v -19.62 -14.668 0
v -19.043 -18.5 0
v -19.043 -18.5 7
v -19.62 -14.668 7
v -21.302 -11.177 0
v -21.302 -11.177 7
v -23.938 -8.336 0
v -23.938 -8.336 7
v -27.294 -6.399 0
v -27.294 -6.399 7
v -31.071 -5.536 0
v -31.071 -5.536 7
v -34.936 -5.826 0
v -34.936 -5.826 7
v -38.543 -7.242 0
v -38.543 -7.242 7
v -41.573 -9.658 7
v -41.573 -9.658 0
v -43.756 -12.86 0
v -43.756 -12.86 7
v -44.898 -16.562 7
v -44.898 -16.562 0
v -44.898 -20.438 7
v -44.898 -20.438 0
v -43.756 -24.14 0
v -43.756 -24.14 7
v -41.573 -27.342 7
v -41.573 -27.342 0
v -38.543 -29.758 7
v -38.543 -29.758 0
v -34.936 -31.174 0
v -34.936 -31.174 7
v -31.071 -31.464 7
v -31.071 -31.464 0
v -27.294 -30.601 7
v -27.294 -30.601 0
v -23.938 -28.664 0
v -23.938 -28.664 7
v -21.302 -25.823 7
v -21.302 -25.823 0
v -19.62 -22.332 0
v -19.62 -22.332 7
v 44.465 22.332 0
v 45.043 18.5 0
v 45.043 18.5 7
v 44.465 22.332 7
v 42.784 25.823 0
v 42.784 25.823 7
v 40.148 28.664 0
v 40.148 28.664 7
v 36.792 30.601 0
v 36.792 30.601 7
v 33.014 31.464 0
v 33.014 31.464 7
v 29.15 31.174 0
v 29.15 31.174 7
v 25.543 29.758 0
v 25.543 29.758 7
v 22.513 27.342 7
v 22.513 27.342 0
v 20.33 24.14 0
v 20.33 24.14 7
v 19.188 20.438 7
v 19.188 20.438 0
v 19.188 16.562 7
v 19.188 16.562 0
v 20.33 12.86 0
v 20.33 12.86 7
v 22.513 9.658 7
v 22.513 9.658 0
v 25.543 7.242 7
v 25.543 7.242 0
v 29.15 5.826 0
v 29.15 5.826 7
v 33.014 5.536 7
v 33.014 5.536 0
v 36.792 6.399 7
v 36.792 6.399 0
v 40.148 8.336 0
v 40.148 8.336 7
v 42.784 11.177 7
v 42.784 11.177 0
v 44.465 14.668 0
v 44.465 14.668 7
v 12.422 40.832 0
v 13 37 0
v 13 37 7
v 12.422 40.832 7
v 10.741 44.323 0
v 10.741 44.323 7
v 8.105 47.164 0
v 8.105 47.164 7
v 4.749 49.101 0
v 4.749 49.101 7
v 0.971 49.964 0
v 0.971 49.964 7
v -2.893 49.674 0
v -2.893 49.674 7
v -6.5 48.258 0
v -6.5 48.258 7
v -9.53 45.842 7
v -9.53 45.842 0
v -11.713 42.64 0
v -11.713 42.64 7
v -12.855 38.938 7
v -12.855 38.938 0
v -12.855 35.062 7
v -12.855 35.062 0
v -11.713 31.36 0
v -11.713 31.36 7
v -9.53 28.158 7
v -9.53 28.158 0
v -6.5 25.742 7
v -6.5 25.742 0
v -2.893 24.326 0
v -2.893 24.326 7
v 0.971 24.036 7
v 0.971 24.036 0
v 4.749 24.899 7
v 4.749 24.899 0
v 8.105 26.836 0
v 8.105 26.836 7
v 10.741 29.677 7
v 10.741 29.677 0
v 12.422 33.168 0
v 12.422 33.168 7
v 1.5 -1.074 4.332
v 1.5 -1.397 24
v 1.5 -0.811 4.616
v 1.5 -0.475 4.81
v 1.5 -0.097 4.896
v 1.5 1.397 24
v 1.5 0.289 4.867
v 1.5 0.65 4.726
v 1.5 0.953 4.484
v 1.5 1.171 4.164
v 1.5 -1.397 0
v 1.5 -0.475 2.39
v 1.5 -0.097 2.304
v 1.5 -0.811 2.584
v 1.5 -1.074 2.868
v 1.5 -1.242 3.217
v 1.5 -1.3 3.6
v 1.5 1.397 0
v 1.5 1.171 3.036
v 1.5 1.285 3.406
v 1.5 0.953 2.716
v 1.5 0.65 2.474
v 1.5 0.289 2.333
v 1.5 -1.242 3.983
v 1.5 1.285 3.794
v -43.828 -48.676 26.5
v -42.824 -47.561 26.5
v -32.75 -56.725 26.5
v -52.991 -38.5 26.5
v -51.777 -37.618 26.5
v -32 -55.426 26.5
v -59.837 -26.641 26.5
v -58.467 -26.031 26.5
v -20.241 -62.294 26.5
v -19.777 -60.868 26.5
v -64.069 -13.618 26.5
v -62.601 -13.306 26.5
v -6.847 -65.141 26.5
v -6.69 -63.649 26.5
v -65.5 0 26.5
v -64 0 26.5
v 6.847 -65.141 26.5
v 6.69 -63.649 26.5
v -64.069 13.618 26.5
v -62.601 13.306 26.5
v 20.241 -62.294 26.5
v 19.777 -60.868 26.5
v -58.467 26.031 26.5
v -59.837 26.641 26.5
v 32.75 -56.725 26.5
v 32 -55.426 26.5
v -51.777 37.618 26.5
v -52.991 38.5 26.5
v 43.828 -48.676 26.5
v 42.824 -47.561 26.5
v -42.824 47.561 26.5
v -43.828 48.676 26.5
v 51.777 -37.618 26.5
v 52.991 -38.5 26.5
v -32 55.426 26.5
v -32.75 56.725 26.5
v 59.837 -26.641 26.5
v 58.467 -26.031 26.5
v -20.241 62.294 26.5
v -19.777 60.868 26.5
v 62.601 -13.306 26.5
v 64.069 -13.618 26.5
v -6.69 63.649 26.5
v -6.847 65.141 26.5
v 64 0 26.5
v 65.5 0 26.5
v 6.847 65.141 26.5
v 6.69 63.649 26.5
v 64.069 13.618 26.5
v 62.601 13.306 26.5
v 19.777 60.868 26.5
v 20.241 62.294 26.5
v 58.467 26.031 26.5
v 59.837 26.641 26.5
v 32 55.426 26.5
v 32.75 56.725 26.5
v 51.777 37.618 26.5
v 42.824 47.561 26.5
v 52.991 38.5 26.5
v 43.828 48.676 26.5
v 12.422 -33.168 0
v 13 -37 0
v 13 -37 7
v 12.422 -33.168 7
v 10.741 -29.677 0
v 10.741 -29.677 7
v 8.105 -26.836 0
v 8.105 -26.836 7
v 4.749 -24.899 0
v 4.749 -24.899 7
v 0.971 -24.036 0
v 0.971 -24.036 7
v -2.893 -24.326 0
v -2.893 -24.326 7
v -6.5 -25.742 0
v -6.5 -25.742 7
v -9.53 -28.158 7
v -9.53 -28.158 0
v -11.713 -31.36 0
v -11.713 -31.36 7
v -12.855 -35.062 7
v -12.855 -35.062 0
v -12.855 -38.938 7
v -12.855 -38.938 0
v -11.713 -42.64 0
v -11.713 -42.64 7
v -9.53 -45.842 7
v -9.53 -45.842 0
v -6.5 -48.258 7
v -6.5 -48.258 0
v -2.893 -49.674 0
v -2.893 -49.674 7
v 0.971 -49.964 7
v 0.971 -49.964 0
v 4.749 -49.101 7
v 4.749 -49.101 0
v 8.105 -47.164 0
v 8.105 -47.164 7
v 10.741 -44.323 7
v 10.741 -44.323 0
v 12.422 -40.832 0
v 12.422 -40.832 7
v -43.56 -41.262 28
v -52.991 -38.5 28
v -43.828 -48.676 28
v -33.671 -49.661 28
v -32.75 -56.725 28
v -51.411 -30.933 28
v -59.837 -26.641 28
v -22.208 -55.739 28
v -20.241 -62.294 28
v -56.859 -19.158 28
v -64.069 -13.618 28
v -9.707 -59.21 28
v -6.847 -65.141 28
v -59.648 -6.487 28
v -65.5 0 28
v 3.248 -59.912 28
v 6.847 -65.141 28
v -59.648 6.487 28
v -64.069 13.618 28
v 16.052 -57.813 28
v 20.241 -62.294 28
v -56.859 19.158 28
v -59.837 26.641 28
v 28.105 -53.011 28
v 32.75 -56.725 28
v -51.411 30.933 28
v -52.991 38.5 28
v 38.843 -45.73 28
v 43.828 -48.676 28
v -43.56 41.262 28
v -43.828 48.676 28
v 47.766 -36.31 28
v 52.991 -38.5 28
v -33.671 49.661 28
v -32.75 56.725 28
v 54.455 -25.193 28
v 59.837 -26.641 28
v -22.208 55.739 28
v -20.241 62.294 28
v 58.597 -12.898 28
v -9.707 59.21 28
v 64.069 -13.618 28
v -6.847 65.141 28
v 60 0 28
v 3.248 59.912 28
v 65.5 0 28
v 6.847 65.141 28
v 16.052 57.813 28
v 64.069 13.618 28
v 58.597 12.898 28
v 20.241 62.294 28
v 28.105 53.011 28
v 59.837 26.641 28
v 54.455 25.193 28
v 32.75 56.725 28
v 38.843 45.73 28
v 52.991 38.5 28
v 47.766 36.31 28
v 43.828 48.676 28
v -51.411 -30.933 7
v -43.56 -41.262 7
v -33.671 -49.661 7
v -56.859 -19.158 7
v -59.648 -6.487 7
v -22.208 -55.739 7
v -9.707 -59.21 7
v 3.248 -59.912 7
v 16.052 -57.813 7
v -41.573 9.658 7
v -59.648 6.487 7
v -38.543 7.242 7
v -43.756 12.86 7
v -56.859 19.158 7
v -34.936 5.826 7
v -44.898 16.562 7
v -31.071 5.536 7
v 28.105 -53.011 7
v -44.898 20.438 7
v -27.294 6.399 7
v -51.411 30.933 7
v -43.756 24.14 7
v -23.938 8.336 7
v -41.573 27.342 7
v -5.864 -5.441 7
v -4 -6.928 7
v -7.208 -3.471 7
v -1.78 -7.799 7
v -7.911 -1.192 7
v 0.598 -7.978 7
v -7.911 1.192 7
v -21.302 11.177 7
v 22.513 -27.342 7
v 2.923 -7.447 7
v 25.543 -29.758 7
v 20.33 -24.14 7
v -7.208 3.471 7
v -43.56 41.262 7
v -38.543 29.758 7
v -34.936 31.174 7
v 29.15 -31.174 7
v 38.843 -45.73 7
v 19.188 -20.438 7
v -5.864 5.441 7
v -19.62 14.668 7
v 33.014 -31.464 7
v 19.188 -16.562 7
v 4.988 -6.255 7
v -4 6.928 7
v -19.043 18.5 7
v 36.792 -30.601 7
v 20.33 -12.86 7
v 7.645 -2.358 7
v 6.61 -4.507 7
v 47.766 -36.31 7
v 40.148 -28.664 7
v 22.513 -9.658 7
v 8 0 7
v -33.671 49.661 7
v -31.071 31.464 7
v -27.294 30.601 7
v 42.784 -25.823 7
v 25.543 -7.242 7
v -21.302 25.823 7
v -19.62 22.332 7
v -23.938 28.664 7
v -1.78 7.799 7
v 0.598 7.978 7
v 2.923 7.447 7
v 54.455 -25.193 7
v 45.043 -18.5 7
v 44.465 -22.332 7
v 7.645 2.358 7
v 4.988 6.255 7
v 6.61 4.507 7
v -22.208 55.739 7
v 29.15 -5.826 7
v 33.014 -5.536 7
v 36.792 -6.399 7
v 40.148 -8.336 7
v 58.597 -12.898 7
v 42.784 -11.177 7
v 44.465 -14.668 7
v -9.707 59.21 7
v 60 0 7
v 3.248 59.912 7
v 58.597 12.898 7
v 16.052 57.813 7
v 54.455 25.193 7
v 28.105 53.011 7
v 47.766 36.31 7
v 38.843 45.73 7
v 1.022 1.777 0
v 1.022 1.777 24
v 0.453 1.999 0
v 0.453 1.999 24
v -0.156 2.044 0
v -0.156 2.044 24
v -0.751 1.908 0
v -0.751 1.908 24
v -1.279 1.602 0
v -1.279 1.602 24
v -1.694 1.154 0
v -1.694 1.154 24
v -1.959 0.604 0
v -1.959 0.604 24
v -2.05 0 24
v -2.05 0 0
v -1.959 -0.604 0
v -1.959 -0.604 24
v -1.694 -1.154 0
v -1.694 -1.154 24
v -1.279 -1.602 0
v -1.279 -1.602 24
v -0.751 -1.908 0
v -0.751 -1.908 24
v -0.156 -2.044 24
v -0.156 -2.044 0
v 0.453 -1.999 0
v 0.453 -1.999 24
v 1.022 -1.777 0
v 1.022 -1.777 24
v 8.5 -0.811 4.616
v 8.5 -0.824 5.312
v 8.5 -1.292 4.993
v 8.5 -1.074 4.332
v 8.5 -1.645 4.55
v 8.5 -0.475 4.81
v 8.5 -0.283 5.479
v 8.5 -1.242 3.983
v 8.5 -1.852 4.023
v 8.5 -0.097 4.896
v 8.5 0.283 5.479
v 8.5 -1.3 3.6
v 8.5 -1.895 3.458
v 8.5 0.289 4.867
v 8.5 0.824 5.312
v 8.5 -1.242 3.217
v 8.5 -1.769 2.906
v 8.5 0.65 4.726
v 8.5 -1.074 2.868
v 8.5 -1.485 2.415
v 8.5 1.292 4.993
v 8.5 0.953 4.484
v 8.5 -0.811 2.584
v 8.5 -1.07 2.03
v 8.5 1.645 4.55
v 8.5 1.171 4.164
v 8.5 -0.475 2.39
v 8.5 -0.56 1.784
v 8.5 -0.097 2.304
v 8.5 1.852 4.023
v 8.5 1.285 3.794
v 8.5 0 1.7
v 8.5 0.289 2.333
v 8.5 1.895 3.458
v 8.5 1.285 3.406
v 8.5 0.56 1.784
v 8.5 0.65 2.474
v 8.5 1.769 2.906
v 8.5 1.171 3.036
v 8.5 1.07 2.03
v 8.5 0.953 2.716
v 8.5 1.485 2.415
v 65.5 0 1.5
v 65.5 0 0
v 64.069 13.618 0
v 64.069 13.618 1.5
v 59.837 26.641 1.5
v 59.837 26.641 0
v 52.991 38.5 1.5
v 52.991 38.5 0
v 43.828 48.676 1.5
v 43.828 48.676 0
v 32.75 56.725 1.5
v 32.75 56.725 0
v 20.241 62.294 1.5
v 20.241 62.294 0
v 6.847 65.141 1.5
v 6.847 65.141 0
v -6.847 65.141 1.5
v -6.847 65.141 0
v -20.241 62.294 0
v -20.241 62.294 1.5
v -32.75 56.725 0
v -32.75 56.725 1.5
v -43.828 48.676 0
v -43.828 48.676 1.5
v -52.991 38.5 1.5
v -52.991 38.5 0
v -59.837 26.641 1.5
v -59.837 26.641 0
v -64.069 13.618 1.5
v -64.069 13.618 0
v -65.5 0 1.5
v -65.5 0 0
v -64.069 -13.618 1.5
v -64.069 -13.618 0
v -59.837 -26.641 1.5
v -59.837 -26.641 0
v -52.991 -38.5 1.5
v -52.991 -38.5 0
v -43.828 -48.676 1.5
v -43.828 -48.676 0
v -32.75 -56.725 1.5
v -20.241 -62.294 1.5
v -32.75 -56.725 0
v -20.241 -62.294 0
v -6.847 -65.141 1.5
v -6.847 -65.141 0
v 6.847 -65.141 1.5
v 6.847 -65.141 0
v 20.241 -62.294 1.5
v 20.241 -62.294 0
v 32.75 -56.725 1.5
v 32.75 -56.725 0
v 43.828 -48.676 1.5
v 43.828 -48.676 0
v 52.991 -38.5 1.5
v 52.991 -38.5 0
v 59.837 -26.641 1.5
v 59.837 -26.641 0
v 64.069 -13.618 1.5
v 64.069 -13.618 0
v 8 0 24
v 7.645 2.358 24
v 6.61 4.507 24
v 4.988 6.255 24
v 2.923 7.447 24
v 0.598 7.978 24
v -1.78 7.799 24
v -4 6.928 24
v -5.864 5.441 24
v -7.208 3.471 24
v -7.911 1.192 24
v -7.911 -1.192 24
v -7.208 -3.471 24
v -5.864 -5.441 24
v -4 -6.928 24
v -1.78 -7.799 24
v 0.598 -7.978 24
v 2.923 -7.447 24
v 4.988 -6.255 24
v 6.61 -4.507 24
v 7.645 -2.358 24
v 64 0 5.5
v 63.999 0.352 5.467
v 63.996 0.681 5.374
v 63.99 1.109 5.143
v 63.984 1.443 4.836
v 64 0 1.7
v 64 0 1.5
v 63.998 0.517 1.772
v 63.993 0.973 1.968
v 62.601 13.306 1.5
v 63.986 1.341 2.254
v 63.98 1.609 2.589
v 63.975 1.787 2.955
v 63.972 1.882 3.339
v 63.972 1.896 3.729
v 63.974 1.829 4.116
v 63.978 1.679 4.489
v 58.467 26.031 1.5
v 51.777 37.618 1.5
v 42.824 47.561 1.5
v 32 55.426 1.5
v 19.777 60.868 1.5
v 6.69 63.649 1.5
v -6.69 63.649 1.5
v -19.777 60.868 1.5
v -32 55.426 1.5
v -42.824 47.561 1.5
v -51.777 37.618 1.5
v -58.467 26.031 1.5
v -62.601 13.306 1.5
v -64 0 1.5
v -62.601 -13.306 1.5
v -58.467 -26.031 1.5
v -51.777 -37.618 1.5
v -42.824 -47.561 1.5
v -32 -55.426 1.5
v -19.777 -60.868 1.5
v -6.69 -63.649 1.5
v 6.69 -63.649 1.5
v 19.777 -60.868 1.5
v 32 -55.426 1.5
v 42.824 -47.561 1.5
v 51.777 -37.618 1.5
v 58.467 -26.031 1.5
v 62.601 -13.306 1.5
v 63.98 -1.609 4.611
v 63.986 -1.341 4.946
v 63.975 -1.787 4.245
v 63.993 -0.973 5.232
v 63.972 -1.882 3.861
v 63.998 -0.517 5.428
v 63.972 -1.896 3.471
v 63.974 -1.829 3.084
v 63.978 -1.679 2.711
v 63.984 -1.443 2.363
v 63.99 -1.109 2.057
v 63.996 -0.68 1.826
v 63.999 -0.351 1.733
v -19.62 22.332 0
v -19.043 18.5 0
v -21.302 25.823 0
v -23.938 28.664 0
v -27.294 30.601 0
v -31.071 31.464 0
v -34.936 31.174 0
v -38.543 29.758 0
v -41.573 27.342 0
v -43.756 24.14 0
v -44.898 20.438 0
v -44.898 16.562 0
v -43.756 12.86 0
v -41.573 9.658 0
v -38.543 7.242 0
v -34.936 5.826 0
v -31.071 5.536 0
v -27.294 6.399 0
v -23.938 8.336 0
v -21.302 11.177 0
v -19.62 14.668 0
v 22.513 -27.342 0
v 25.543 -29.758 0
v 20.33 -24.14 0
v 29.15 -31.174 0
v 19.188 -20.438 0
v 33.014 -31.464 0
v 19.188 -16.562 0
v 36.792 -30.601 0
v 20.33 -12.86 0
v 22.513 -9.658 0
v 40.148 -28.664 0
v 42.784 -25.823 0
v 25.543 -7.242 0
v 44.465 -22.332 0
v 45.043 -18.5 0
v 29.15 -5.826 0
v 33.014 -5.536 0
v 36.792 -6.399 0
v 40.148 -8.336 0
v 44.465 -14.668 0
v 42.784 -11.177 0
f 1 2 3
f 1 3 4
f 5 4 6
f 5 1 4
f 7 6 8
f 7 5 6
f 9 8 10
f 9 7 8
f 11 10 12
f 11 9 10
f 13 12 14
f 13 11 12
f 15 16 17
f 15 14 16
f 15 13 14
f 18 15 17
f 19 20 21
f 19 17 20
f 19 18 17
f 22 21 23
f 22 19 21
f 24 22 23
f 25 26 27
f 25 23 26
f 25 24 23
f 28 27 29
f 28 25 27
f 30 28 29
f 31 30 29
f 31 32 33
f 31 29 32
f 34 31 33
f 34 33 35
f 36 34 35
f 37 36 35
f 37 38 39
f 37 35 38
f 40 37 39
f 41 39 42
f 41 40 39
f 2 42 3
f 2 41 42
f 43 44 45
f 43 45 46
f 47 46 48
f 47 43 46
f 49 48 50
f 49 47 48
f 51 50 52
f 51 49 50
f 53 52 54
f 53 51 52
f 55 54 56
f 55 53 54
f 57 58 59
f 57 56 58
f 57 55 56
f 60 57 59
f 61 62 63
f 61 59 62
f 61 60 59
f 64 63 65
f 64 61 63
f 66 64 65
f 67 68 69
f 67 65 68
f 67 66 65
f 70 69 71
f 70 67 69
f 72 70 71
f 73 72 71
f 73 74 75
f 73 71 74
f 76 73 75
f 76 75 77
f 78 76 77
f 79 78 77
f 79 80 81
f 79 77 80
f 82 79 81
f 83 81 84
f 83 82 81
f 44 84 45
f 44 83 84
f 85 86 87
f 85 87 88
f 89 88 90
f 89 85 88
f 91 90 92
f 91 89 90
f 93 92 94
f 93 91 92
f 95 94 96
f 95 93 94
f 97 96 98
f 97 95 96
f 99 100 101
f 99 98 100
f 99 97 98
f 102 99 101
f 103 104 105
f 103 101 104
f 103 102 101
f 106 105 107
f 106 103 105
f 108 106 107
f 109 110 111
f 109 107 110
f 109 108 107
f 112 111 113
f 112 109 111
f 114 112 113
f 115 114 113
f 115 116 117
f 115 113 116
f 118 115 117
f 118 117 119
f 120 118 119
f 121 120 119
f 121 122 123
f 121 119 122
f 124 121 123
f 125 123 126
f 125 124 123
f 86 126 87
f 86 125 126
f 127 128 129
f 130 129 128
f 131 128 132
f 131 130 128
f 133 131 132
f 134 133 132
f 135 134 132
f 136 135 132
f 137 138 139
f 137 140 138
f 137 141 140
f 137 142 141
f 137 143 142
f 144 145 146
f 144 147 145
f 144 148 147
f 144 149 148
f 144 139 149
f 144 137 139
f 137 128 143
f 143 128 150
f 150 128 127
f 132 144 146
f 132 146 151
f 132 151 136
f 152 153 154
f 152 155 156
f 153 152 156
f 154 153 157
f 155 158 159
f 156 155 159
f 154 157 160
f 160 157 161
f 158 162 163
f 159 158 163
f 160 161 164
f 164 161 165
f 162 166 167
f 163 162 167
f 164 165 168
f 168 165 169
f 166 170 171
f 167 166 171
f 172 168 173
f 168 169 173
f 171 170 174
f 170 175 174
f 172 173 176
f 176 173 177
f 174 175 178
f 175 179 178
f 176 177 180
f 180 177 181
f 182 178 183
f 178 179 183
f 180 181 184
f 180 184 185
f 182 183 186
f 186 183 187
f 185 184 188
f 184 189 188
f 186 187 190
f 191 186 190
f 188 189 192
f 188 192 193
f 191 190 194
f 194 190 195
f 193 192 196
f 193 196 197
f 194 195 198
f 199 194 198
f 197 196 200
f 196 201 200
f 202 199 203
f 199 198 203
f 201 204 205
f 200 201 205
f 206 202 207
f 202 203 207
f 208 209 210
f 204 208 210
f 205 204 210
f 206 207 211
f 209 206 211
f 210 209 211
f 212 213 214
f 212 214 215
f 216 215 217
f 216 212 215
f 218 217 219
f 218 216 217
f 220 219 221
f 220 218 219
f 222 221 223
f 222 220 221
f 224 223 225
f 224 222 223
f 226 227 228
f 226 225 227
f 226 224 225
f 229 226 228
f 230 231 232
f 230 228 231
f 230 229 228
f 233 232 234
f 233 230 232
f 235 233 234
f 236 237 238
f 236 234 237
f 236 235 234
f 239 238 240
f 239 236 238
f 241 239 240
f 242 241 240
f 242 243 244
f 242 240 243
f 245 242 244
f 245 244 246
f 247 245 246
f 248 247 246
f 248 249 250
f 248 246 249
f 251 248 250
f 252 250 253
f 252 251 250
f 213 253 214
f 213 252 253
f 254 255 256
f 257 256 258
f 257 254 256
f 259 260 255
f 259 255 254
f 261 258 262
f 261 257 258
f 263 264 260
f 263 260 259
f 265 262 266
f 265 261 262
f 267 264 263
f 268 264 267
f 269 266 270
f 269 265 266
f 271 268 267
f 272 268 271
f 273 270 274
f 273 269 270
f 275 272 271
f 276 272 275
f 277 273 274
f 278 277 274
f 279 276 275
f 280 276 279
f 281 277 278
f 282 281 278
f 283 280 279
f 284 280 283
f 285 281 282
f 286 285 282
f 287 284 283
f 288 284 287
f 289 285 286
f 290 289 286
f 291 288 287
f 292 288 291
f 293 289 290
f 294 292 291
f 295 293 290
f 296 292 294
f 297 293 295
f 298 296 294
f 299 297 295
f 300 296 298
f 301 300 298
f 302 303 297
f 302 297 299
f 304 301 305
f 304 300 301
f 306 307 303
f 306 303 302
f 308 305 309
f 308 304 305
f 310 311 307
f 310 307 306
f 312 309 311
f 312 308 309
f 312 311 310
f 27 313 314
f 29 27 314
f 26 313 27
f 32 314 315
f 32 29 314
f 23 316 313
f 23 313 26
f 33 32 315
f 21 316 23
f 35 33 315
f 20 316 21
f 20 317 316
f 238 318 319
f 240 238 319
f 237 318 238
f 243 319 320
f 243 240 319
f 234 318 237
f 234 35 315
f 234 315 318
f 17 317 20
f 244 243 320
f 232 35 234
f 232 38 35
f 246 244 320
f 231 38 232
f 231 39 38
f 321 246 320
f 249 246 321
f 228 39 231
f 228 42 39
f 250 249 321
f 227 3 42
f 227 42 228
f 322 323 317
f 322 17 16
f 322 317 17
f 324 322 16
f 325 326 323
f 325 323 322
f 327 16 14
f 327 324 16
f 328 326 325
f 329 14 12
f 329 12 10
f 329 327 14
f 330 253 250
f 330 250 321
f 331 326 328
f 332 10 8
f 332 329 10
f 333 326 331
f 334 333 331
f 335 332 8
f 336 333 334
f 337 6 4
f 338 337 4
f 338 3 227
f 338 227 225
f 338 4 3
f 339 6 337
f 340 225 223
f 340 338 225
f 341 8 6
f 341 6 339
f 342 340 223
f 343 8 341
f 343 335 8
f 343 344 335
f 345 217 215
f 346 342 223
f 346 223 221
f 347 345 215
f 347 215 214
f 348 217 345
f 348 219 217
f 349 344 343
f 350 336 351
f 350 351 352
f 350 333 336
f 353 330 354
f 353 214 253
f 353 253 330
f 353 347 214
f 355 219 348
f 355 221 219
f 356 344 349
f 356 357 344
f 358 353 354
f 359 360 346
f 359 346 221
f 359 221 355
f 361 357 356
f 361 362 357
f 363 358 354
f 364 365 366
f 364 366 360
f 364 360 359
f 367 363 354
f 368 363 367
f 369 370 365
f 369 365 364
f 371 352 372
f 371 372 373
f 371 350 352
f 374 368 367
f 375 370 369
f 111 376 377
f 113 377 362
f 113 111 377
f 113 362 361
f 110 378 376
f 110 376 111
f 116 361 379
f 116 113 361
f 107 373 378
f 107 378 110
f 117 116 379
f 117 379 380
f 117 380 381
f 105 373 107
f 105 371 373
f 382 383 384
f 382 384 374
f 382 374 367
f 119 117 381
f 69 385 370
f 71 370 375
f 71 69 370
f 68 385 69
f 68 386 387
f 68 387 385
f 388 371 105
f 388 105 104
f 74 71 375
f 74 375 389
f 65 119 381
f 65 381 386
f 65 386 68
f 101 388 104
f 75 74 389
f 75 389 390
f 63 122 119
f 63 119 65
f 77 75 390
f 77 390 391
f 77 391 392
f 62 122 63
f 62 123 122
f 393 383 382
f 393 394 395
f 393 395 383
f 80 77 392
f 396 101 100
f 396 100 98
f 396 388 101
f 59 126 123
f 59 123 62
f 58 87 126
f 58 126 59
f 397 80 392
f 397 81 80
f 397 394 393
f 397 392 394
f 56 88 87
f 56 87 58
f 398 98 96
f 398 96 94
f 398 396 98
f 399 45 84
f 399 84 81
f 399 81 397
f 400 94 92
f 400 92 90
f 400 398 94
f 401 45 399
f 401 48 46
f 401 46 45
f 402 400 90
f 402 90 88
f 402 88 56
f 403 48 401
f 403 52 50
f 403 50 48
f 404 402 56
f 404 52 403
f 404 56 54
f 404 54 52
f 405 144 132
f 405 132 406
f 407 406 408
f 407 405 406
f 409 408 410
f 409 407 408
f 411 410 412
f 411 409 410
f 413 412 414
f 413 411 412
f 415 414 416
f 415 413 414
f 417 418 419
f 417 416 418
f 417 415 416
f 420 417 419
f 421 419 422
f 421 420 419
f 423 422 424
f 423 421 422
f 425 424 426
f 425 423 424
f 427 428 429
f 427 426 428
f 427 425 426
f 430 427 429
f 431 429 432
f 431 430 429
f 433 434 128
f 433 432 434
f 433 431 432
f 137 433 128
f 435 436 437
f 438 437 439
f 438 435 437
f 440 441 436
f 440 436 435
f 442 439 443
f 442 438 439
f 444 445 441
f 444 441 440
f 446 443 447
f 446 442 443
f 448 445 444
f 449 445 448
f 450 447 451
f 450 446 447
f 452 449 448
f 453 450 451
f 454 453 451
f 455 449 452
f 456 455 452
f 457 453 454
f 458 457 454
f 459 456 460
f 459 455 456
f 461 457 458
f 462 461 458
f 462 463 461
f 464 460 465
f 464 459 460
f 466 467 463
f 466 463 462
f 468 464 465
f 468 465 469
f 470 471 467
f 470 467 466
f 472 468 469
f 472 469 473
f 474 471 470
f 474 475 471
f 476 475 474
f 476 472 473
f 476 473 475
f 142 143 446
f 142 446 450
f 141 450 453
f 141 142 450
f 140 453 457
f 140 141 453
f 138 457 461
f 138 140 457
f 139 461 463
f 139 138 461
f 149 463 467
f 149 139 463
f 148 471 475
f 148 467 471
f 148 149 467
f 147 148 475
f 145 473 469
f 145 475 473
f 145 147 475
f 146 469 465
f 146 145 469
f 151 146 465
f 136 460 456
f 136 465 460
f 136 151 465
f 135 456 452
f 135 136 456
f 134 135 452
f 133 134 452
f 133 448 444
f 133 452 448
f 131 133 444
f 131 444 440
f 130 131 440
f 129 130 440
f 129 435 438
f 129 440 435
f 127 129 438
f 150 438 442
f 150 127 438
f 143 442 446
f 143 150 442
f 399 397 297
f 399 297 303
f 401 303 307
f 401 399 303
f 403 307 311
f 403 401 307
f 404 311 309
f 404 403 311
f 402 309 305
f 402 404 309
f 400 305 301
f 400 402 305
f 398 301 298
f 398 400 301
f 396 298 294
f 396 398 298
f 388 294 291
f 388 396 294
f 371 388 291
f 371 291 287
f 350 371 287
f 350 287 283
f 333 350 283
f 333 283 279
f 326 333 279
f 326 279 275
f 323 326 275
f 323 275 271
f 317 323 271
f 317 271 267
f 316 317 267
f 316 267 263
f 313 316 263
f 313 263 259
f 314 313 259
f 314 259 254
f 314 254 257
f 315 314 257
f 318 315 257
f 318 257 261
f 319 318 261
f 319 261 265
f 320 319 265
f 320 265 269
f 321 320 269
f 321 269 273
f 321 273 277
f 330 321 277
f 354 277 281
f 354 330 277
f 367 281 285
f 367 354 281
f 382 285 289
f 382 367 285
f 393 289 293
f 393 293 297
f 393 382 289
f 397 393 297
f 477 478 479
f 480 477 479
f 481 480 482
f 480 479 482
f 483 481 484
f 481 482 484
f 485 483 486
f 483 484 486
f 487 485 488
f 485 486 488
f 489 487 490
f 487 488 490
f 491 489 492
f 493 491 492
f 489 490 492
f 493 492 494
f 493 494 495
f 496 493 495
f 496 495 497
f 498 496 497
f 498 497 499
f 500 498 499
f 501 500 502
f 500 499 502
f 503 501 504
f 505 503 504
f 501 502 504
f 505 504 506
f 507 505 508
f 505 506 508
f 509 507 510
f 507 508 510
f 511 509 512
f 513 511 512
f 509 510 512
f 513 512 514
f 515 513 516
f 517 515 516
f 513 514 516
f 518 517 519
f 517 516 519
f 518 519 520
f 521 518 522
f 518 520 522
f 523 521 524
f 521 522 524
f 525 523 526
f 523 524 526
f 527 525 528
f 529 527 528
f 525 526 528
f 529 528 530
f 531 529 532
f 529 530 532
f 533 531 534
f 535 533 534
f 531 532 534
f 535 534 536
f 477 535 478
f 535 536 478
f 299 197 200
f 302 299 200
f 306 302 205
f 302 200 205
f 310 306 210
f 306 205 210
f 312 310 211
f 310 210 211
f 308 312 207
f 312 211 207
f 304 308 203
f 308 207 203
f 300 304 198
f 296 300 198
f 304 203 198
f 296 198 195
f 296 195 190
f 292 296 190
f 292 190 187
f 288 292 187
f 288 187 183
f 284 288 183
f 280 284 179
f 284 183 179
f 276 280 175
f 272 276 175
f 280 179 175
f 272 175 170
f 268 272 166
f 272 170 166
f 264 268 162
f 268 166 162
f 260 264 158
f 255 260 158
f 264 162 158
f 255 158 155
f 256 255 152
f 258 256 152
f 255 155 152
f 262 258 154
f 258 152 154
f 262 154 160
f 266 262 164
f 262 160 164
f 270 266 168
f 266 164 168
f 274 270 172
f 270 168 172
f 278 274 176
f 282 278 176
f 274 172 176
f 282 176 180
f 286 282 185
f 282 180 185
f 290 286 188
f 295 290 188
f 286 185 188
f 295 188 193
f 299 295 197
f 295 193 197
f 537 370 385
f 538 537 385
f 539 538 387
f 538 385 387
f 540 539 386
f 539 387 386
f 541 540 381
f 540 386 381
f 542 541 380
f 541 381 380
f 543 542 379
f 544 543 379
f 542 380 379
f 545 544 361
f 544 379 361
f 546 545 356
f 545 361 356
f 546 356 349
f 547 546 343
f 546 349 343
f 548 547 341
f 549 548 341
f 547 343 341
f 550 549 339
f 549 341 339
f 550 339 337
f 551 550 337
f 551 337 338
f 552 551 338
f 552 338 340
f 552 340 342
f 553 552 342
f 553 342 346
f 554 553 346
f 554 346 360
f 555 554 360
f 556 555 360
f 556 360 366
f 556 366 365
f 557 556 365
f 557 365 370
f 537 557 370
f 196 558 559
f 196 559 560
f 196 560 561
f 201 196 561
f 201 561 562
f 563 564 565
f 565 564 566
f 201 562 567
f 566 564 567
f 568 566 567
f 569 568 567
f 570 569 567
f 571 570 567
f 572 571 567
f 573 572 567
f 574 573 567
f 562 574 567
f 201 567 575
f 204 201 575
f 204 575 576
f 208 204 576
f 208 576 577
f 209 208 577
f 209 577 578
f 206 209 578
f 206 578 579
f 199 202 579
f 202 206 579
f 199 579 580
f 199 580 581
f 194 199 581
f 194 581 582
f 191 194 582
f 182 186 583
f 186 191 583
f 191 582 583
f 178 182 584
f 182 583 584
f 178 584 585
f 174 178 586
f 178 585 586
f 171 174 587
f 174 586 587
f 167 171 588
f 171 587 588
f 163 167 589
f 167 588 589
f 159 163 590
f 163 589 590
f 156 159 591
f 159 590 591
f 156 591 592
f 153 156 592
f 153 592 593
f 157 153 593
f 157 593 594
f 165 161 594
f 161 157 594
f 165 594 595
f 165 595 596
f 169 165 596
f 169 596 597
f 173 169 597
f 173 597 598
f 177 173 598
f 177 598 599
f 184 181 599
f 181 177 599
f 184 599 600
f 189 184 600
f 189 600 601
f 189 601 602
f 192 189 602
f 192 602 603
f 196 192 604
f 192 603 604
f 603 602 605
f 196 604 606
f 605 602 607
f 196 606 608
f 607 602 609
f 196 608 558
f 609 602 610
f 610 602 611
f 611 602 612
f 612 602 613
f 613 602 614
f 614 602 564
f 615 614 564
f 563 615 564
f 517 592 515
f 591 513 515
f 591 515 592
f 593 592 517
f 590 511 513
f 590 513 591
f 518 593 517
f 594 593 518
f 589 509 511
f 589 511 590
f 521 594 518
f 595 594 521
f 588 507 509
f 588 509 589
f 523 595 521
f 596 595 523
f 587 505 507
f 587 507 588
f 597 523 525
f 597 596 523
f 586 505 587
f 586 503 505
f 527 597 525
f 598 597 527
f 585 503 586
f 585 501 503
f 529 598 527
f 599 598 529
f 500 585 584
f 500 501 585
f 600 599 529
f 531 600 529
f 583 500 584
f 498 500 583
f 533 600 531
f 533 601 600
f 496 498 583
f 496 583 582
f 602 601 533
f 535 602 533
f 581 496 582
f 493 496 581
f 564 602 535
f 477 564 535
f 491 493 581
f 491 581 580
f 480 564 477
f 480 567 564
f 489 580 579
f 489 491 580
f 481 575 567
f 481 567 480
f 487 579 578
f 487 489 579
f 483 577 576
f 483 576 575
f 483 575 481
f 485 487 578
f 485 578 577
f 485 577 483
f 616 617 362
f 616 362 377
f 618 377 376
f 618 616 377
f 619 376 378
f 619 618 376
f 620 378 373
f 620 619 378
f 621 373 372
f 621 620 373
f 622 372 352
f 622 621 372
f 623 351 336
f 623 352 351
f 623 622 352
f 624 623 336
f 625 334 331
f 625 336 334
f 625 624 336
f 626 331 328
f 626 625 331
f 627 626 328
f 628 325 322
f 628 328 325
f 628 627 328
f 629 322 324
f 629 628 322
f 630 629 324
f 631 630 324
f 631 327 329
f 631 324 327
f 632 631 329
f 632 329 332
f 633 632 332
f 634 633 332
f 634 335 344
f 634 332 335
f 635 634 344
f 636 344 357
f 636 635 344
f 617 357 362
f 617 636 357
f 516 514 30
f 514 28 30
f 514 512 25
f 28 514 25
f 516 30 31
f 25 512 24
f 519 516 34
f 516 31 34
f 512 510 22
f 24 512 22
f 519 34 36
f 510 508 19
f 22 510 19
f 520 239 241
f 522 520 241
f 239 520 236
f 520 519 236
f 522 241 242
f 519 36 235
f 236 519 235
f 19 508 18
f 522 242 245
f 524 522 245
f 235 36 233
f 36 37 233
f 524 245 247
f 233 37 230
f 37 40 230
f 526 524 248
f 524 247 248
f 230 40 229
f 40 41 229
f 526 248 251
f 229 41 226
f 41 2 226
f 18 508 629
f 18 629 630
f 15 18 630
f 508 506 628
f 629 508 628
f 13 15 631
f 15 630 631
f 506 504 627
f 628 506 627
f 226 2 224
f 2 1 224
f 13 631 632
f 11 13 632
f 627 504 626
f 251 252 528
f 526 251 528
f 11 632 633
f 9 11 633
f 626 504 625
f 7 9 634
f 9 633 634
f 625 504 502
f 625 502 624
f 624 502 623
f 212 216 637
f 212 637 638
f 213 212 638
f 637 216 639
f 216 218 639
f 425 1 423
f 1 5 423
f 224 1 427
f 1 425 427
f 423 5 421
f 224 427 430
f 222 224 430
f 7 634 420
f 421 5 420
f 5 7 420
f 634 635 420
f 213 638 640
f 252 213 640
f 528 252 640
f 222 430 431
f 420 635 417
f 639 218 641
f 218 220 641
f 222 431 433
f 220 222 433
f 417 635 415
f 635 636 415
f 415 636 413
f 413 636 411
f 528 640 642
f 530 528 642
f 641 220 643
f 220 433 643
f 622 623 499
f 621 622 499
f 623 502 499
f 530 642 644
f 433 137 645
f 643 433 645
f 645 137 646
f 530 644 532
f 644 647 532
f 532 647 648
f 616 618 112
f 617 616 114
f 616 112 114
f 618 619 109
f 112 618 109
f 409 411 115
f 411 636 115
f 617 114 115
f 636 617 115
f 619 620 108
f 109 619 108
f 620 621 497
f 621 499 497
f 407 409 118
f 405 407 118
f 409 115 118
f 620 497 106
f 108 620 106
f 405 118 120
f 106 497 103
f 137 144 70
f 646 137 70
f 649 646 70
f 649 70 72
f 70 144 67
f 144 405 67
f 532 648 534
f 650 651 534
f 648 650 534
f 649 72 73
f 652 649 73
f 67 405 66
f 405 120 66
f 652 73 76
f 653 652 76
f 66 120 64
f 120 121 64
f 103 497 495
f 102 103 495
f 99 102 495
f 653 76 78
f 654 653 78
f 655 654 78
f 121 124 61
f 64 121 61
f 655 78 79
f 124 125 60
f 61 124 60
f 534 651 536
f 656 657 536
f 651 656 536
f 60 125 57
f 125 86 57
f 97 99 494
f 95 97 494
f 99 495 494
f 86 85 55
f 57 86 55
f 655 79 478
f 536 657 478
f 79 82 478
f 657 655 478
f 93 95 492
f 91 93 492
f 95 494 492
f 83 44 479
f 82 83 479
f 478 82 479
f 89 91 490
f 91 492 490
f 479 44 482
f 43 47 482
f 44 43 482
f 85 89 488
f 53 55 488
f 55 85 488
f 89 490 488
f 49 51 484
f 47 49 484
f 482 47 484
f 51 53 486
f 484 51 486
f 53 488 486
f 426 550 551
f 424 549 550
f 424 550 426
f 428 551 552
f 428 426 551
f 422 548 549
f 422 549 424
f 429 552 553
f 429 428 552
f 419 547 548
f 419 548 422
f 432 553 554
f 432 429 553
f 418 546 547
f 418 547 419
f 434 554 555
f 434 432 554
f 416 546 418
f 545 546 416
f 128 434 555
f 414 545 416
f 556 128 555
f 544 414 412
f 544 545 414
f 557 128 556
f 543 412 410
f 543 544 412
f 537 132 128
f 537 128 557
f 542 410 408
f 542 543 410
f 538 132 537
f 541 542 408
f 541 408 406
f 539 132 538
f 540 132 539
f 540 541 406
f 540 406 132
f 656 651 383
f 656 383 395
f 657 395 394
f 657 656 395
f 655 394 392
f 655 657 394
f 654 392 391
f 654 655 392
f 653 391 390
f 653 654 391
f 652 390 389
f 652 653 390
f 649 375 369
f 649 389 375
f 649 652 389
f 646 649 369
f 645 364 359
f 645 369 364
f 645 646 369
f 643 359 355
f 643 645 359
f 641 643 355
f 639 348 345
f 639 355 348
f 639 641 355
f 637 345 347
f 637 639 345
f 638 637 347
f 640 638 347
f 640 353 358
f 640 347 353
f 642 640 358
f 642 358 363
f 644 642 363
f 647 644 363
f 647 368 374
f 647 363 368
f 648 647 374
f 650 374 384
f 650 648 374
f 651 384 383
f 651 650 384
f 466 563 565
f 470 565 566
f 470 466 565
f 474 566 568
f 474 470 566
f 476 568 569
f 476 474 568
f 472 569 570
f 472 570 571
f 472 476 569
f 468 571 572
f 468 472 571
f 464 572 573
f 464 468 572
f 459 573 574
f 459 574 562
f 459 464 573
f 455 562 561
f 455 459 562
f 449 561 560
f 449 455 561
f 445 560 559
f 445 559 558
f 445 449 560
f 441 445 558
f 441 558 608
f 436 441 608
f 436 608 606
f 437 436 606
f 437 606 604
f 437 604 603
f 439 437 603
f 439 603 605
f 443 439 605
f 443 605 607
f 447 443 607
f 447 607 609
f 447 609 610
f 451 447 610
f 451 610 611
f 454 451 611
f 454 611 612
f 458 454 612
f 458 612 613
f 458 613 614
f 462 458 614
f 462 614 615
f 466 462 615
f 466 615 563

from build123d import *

# Parameters (mm, degrees)
SKETCH1_R              = 64
SKETCH1_R_2            = 60
RIM_DEPTH              = 28
SKETCH2_R              = 65.5
SKETCH2_R_2            = 63
INNER_BEAD_LIP_DEPTH   = 1.5
SKETCH3_R              = 65.5
SKETCH3_R_2            = 63
OUTER_BEAD_LIP_DEPTH   = 1.5
SKETCH4_R              = 61
WEB_DEPTH              = 7
SKETCH5_R              = 8
HUB_BOSS_DEPTH         = 24
SKETCH6_R              = 13
LIGHTENING_HOLES_DEPTH = 9
D_BORE_4MM_DEPTH       = 30
SKETCH8_R              = 1.3
GRUB_SCREW_M3_DEPTH    = 9
SKETCH9_R              = 1.9
GRUB_KEY_ACCESS_DEPTH  = 57.5


with BuildPart() as part:
    # Sketch1 → Rim (new body)
    with BuildSketch(Plane.XY):
        Circle(SKETCH1_R)
        Circle(SKETCH1_R_2, mode=Mode.SUBTRACT)
    extrude(amount=RIM_DEPTH)

    # Sketch2 → Inner_bead_lip (add)
    with BuildSketch(Plane.XY):
        Circle(SKETCH2_R)
        Circle(SKETCH2_R_2, mode=Mode.SUBTRACT)
    extrude(amount=INNER_BEAD_LIP_DEPTH)

    # Sketch3 → Outer_bead_lip (add)
    with BuildSketch(Plane.XY.offset(26.5)):
        Circle(SKETCH3_R)
        Circle(SKETCH3_R_2, mode=Mode.SUBTRACT)
    extrude(amount=OUTER_BEAD_LIP_DEPTH)

    # Sketch4 → Web (add)
    with BuildSketch(Plane.XY):
        Circle(SKETCH4_R)
    extrude(amount=WEB_DEPTH)

    # Sketch5 → Hub_boss (add)
    with BuildSketch(Plane.XY):
        Circle(SKETCH5_R)
    extrude(amount=HUB_BOSS_DEPTH)

    # Sketch6 → Lightening_holes (cut)
    with BuildSketch(Plane.XY.offset(-1)):
        with Locations((32.04293994, 18.5)):
            Circle(SKETCH6_R)
        with Locations((0, 37)):
            Circle(SKETCH6_R)
        with Locations((-32.04293994, 18.5)):
            Circle(SKETCH6_R)
        with Locations((-32.04293994, -18.5)):
            Circle(SKETCH6_R)
        with Locations((0, -37)):
            Circle(SKETCH6_R)
        with Locations((32.04293994, -18.5)):
            Circle(SKETCH6_R)
    extrude(amount=LIGHTENING_HOLES_DEPTH, mode=Mode.SUBTRACT)

    # Sketch7 → D_bore_4mm (cut)
    with BuildSketch(Plane.XY.offset(-1)):
        with BuildLine():
            Line((1.5, -1.397318861), (1.5, 1.397318861))
            ThreePointArc((1.5, 1.397318861), (-2.05, 0), (1.5, -1.397318861))
        make_face()
    extrude(amount=D_BORE_4MM_DEPTH, mode=Mode.SUBTRACT)

    # Sketch8 → Grub_screw_M3 (cut)
    with BuildSketch(Plane(origin=(0, 0, 0), x_dir=(0, 0, -1), z_dir=(1, 0, 0))):
        with Locations(Location((-3.6, 0, 0), (0, 0, 270))):
            Circle(SKETCH8_R)
    extrude(amount=GRUB_SCREW_M3_DEPTH, mode=Mode.SUBTRACT)

    # Sketch9 → Grub_key_access (cut)
    with BuildSketch(Plane(origin=(8.5, 0, 0), x_dir=(0, 0, -1), z_dir=(1, 0, 0))):
        with Locations((-3.6, 0)):
            Circle(SKETCH9_R)
    extrude(amount=GRUB_KEY_ACCESS_DEPTH, mode=Mode.SUBTRACT)


solid = part.part
